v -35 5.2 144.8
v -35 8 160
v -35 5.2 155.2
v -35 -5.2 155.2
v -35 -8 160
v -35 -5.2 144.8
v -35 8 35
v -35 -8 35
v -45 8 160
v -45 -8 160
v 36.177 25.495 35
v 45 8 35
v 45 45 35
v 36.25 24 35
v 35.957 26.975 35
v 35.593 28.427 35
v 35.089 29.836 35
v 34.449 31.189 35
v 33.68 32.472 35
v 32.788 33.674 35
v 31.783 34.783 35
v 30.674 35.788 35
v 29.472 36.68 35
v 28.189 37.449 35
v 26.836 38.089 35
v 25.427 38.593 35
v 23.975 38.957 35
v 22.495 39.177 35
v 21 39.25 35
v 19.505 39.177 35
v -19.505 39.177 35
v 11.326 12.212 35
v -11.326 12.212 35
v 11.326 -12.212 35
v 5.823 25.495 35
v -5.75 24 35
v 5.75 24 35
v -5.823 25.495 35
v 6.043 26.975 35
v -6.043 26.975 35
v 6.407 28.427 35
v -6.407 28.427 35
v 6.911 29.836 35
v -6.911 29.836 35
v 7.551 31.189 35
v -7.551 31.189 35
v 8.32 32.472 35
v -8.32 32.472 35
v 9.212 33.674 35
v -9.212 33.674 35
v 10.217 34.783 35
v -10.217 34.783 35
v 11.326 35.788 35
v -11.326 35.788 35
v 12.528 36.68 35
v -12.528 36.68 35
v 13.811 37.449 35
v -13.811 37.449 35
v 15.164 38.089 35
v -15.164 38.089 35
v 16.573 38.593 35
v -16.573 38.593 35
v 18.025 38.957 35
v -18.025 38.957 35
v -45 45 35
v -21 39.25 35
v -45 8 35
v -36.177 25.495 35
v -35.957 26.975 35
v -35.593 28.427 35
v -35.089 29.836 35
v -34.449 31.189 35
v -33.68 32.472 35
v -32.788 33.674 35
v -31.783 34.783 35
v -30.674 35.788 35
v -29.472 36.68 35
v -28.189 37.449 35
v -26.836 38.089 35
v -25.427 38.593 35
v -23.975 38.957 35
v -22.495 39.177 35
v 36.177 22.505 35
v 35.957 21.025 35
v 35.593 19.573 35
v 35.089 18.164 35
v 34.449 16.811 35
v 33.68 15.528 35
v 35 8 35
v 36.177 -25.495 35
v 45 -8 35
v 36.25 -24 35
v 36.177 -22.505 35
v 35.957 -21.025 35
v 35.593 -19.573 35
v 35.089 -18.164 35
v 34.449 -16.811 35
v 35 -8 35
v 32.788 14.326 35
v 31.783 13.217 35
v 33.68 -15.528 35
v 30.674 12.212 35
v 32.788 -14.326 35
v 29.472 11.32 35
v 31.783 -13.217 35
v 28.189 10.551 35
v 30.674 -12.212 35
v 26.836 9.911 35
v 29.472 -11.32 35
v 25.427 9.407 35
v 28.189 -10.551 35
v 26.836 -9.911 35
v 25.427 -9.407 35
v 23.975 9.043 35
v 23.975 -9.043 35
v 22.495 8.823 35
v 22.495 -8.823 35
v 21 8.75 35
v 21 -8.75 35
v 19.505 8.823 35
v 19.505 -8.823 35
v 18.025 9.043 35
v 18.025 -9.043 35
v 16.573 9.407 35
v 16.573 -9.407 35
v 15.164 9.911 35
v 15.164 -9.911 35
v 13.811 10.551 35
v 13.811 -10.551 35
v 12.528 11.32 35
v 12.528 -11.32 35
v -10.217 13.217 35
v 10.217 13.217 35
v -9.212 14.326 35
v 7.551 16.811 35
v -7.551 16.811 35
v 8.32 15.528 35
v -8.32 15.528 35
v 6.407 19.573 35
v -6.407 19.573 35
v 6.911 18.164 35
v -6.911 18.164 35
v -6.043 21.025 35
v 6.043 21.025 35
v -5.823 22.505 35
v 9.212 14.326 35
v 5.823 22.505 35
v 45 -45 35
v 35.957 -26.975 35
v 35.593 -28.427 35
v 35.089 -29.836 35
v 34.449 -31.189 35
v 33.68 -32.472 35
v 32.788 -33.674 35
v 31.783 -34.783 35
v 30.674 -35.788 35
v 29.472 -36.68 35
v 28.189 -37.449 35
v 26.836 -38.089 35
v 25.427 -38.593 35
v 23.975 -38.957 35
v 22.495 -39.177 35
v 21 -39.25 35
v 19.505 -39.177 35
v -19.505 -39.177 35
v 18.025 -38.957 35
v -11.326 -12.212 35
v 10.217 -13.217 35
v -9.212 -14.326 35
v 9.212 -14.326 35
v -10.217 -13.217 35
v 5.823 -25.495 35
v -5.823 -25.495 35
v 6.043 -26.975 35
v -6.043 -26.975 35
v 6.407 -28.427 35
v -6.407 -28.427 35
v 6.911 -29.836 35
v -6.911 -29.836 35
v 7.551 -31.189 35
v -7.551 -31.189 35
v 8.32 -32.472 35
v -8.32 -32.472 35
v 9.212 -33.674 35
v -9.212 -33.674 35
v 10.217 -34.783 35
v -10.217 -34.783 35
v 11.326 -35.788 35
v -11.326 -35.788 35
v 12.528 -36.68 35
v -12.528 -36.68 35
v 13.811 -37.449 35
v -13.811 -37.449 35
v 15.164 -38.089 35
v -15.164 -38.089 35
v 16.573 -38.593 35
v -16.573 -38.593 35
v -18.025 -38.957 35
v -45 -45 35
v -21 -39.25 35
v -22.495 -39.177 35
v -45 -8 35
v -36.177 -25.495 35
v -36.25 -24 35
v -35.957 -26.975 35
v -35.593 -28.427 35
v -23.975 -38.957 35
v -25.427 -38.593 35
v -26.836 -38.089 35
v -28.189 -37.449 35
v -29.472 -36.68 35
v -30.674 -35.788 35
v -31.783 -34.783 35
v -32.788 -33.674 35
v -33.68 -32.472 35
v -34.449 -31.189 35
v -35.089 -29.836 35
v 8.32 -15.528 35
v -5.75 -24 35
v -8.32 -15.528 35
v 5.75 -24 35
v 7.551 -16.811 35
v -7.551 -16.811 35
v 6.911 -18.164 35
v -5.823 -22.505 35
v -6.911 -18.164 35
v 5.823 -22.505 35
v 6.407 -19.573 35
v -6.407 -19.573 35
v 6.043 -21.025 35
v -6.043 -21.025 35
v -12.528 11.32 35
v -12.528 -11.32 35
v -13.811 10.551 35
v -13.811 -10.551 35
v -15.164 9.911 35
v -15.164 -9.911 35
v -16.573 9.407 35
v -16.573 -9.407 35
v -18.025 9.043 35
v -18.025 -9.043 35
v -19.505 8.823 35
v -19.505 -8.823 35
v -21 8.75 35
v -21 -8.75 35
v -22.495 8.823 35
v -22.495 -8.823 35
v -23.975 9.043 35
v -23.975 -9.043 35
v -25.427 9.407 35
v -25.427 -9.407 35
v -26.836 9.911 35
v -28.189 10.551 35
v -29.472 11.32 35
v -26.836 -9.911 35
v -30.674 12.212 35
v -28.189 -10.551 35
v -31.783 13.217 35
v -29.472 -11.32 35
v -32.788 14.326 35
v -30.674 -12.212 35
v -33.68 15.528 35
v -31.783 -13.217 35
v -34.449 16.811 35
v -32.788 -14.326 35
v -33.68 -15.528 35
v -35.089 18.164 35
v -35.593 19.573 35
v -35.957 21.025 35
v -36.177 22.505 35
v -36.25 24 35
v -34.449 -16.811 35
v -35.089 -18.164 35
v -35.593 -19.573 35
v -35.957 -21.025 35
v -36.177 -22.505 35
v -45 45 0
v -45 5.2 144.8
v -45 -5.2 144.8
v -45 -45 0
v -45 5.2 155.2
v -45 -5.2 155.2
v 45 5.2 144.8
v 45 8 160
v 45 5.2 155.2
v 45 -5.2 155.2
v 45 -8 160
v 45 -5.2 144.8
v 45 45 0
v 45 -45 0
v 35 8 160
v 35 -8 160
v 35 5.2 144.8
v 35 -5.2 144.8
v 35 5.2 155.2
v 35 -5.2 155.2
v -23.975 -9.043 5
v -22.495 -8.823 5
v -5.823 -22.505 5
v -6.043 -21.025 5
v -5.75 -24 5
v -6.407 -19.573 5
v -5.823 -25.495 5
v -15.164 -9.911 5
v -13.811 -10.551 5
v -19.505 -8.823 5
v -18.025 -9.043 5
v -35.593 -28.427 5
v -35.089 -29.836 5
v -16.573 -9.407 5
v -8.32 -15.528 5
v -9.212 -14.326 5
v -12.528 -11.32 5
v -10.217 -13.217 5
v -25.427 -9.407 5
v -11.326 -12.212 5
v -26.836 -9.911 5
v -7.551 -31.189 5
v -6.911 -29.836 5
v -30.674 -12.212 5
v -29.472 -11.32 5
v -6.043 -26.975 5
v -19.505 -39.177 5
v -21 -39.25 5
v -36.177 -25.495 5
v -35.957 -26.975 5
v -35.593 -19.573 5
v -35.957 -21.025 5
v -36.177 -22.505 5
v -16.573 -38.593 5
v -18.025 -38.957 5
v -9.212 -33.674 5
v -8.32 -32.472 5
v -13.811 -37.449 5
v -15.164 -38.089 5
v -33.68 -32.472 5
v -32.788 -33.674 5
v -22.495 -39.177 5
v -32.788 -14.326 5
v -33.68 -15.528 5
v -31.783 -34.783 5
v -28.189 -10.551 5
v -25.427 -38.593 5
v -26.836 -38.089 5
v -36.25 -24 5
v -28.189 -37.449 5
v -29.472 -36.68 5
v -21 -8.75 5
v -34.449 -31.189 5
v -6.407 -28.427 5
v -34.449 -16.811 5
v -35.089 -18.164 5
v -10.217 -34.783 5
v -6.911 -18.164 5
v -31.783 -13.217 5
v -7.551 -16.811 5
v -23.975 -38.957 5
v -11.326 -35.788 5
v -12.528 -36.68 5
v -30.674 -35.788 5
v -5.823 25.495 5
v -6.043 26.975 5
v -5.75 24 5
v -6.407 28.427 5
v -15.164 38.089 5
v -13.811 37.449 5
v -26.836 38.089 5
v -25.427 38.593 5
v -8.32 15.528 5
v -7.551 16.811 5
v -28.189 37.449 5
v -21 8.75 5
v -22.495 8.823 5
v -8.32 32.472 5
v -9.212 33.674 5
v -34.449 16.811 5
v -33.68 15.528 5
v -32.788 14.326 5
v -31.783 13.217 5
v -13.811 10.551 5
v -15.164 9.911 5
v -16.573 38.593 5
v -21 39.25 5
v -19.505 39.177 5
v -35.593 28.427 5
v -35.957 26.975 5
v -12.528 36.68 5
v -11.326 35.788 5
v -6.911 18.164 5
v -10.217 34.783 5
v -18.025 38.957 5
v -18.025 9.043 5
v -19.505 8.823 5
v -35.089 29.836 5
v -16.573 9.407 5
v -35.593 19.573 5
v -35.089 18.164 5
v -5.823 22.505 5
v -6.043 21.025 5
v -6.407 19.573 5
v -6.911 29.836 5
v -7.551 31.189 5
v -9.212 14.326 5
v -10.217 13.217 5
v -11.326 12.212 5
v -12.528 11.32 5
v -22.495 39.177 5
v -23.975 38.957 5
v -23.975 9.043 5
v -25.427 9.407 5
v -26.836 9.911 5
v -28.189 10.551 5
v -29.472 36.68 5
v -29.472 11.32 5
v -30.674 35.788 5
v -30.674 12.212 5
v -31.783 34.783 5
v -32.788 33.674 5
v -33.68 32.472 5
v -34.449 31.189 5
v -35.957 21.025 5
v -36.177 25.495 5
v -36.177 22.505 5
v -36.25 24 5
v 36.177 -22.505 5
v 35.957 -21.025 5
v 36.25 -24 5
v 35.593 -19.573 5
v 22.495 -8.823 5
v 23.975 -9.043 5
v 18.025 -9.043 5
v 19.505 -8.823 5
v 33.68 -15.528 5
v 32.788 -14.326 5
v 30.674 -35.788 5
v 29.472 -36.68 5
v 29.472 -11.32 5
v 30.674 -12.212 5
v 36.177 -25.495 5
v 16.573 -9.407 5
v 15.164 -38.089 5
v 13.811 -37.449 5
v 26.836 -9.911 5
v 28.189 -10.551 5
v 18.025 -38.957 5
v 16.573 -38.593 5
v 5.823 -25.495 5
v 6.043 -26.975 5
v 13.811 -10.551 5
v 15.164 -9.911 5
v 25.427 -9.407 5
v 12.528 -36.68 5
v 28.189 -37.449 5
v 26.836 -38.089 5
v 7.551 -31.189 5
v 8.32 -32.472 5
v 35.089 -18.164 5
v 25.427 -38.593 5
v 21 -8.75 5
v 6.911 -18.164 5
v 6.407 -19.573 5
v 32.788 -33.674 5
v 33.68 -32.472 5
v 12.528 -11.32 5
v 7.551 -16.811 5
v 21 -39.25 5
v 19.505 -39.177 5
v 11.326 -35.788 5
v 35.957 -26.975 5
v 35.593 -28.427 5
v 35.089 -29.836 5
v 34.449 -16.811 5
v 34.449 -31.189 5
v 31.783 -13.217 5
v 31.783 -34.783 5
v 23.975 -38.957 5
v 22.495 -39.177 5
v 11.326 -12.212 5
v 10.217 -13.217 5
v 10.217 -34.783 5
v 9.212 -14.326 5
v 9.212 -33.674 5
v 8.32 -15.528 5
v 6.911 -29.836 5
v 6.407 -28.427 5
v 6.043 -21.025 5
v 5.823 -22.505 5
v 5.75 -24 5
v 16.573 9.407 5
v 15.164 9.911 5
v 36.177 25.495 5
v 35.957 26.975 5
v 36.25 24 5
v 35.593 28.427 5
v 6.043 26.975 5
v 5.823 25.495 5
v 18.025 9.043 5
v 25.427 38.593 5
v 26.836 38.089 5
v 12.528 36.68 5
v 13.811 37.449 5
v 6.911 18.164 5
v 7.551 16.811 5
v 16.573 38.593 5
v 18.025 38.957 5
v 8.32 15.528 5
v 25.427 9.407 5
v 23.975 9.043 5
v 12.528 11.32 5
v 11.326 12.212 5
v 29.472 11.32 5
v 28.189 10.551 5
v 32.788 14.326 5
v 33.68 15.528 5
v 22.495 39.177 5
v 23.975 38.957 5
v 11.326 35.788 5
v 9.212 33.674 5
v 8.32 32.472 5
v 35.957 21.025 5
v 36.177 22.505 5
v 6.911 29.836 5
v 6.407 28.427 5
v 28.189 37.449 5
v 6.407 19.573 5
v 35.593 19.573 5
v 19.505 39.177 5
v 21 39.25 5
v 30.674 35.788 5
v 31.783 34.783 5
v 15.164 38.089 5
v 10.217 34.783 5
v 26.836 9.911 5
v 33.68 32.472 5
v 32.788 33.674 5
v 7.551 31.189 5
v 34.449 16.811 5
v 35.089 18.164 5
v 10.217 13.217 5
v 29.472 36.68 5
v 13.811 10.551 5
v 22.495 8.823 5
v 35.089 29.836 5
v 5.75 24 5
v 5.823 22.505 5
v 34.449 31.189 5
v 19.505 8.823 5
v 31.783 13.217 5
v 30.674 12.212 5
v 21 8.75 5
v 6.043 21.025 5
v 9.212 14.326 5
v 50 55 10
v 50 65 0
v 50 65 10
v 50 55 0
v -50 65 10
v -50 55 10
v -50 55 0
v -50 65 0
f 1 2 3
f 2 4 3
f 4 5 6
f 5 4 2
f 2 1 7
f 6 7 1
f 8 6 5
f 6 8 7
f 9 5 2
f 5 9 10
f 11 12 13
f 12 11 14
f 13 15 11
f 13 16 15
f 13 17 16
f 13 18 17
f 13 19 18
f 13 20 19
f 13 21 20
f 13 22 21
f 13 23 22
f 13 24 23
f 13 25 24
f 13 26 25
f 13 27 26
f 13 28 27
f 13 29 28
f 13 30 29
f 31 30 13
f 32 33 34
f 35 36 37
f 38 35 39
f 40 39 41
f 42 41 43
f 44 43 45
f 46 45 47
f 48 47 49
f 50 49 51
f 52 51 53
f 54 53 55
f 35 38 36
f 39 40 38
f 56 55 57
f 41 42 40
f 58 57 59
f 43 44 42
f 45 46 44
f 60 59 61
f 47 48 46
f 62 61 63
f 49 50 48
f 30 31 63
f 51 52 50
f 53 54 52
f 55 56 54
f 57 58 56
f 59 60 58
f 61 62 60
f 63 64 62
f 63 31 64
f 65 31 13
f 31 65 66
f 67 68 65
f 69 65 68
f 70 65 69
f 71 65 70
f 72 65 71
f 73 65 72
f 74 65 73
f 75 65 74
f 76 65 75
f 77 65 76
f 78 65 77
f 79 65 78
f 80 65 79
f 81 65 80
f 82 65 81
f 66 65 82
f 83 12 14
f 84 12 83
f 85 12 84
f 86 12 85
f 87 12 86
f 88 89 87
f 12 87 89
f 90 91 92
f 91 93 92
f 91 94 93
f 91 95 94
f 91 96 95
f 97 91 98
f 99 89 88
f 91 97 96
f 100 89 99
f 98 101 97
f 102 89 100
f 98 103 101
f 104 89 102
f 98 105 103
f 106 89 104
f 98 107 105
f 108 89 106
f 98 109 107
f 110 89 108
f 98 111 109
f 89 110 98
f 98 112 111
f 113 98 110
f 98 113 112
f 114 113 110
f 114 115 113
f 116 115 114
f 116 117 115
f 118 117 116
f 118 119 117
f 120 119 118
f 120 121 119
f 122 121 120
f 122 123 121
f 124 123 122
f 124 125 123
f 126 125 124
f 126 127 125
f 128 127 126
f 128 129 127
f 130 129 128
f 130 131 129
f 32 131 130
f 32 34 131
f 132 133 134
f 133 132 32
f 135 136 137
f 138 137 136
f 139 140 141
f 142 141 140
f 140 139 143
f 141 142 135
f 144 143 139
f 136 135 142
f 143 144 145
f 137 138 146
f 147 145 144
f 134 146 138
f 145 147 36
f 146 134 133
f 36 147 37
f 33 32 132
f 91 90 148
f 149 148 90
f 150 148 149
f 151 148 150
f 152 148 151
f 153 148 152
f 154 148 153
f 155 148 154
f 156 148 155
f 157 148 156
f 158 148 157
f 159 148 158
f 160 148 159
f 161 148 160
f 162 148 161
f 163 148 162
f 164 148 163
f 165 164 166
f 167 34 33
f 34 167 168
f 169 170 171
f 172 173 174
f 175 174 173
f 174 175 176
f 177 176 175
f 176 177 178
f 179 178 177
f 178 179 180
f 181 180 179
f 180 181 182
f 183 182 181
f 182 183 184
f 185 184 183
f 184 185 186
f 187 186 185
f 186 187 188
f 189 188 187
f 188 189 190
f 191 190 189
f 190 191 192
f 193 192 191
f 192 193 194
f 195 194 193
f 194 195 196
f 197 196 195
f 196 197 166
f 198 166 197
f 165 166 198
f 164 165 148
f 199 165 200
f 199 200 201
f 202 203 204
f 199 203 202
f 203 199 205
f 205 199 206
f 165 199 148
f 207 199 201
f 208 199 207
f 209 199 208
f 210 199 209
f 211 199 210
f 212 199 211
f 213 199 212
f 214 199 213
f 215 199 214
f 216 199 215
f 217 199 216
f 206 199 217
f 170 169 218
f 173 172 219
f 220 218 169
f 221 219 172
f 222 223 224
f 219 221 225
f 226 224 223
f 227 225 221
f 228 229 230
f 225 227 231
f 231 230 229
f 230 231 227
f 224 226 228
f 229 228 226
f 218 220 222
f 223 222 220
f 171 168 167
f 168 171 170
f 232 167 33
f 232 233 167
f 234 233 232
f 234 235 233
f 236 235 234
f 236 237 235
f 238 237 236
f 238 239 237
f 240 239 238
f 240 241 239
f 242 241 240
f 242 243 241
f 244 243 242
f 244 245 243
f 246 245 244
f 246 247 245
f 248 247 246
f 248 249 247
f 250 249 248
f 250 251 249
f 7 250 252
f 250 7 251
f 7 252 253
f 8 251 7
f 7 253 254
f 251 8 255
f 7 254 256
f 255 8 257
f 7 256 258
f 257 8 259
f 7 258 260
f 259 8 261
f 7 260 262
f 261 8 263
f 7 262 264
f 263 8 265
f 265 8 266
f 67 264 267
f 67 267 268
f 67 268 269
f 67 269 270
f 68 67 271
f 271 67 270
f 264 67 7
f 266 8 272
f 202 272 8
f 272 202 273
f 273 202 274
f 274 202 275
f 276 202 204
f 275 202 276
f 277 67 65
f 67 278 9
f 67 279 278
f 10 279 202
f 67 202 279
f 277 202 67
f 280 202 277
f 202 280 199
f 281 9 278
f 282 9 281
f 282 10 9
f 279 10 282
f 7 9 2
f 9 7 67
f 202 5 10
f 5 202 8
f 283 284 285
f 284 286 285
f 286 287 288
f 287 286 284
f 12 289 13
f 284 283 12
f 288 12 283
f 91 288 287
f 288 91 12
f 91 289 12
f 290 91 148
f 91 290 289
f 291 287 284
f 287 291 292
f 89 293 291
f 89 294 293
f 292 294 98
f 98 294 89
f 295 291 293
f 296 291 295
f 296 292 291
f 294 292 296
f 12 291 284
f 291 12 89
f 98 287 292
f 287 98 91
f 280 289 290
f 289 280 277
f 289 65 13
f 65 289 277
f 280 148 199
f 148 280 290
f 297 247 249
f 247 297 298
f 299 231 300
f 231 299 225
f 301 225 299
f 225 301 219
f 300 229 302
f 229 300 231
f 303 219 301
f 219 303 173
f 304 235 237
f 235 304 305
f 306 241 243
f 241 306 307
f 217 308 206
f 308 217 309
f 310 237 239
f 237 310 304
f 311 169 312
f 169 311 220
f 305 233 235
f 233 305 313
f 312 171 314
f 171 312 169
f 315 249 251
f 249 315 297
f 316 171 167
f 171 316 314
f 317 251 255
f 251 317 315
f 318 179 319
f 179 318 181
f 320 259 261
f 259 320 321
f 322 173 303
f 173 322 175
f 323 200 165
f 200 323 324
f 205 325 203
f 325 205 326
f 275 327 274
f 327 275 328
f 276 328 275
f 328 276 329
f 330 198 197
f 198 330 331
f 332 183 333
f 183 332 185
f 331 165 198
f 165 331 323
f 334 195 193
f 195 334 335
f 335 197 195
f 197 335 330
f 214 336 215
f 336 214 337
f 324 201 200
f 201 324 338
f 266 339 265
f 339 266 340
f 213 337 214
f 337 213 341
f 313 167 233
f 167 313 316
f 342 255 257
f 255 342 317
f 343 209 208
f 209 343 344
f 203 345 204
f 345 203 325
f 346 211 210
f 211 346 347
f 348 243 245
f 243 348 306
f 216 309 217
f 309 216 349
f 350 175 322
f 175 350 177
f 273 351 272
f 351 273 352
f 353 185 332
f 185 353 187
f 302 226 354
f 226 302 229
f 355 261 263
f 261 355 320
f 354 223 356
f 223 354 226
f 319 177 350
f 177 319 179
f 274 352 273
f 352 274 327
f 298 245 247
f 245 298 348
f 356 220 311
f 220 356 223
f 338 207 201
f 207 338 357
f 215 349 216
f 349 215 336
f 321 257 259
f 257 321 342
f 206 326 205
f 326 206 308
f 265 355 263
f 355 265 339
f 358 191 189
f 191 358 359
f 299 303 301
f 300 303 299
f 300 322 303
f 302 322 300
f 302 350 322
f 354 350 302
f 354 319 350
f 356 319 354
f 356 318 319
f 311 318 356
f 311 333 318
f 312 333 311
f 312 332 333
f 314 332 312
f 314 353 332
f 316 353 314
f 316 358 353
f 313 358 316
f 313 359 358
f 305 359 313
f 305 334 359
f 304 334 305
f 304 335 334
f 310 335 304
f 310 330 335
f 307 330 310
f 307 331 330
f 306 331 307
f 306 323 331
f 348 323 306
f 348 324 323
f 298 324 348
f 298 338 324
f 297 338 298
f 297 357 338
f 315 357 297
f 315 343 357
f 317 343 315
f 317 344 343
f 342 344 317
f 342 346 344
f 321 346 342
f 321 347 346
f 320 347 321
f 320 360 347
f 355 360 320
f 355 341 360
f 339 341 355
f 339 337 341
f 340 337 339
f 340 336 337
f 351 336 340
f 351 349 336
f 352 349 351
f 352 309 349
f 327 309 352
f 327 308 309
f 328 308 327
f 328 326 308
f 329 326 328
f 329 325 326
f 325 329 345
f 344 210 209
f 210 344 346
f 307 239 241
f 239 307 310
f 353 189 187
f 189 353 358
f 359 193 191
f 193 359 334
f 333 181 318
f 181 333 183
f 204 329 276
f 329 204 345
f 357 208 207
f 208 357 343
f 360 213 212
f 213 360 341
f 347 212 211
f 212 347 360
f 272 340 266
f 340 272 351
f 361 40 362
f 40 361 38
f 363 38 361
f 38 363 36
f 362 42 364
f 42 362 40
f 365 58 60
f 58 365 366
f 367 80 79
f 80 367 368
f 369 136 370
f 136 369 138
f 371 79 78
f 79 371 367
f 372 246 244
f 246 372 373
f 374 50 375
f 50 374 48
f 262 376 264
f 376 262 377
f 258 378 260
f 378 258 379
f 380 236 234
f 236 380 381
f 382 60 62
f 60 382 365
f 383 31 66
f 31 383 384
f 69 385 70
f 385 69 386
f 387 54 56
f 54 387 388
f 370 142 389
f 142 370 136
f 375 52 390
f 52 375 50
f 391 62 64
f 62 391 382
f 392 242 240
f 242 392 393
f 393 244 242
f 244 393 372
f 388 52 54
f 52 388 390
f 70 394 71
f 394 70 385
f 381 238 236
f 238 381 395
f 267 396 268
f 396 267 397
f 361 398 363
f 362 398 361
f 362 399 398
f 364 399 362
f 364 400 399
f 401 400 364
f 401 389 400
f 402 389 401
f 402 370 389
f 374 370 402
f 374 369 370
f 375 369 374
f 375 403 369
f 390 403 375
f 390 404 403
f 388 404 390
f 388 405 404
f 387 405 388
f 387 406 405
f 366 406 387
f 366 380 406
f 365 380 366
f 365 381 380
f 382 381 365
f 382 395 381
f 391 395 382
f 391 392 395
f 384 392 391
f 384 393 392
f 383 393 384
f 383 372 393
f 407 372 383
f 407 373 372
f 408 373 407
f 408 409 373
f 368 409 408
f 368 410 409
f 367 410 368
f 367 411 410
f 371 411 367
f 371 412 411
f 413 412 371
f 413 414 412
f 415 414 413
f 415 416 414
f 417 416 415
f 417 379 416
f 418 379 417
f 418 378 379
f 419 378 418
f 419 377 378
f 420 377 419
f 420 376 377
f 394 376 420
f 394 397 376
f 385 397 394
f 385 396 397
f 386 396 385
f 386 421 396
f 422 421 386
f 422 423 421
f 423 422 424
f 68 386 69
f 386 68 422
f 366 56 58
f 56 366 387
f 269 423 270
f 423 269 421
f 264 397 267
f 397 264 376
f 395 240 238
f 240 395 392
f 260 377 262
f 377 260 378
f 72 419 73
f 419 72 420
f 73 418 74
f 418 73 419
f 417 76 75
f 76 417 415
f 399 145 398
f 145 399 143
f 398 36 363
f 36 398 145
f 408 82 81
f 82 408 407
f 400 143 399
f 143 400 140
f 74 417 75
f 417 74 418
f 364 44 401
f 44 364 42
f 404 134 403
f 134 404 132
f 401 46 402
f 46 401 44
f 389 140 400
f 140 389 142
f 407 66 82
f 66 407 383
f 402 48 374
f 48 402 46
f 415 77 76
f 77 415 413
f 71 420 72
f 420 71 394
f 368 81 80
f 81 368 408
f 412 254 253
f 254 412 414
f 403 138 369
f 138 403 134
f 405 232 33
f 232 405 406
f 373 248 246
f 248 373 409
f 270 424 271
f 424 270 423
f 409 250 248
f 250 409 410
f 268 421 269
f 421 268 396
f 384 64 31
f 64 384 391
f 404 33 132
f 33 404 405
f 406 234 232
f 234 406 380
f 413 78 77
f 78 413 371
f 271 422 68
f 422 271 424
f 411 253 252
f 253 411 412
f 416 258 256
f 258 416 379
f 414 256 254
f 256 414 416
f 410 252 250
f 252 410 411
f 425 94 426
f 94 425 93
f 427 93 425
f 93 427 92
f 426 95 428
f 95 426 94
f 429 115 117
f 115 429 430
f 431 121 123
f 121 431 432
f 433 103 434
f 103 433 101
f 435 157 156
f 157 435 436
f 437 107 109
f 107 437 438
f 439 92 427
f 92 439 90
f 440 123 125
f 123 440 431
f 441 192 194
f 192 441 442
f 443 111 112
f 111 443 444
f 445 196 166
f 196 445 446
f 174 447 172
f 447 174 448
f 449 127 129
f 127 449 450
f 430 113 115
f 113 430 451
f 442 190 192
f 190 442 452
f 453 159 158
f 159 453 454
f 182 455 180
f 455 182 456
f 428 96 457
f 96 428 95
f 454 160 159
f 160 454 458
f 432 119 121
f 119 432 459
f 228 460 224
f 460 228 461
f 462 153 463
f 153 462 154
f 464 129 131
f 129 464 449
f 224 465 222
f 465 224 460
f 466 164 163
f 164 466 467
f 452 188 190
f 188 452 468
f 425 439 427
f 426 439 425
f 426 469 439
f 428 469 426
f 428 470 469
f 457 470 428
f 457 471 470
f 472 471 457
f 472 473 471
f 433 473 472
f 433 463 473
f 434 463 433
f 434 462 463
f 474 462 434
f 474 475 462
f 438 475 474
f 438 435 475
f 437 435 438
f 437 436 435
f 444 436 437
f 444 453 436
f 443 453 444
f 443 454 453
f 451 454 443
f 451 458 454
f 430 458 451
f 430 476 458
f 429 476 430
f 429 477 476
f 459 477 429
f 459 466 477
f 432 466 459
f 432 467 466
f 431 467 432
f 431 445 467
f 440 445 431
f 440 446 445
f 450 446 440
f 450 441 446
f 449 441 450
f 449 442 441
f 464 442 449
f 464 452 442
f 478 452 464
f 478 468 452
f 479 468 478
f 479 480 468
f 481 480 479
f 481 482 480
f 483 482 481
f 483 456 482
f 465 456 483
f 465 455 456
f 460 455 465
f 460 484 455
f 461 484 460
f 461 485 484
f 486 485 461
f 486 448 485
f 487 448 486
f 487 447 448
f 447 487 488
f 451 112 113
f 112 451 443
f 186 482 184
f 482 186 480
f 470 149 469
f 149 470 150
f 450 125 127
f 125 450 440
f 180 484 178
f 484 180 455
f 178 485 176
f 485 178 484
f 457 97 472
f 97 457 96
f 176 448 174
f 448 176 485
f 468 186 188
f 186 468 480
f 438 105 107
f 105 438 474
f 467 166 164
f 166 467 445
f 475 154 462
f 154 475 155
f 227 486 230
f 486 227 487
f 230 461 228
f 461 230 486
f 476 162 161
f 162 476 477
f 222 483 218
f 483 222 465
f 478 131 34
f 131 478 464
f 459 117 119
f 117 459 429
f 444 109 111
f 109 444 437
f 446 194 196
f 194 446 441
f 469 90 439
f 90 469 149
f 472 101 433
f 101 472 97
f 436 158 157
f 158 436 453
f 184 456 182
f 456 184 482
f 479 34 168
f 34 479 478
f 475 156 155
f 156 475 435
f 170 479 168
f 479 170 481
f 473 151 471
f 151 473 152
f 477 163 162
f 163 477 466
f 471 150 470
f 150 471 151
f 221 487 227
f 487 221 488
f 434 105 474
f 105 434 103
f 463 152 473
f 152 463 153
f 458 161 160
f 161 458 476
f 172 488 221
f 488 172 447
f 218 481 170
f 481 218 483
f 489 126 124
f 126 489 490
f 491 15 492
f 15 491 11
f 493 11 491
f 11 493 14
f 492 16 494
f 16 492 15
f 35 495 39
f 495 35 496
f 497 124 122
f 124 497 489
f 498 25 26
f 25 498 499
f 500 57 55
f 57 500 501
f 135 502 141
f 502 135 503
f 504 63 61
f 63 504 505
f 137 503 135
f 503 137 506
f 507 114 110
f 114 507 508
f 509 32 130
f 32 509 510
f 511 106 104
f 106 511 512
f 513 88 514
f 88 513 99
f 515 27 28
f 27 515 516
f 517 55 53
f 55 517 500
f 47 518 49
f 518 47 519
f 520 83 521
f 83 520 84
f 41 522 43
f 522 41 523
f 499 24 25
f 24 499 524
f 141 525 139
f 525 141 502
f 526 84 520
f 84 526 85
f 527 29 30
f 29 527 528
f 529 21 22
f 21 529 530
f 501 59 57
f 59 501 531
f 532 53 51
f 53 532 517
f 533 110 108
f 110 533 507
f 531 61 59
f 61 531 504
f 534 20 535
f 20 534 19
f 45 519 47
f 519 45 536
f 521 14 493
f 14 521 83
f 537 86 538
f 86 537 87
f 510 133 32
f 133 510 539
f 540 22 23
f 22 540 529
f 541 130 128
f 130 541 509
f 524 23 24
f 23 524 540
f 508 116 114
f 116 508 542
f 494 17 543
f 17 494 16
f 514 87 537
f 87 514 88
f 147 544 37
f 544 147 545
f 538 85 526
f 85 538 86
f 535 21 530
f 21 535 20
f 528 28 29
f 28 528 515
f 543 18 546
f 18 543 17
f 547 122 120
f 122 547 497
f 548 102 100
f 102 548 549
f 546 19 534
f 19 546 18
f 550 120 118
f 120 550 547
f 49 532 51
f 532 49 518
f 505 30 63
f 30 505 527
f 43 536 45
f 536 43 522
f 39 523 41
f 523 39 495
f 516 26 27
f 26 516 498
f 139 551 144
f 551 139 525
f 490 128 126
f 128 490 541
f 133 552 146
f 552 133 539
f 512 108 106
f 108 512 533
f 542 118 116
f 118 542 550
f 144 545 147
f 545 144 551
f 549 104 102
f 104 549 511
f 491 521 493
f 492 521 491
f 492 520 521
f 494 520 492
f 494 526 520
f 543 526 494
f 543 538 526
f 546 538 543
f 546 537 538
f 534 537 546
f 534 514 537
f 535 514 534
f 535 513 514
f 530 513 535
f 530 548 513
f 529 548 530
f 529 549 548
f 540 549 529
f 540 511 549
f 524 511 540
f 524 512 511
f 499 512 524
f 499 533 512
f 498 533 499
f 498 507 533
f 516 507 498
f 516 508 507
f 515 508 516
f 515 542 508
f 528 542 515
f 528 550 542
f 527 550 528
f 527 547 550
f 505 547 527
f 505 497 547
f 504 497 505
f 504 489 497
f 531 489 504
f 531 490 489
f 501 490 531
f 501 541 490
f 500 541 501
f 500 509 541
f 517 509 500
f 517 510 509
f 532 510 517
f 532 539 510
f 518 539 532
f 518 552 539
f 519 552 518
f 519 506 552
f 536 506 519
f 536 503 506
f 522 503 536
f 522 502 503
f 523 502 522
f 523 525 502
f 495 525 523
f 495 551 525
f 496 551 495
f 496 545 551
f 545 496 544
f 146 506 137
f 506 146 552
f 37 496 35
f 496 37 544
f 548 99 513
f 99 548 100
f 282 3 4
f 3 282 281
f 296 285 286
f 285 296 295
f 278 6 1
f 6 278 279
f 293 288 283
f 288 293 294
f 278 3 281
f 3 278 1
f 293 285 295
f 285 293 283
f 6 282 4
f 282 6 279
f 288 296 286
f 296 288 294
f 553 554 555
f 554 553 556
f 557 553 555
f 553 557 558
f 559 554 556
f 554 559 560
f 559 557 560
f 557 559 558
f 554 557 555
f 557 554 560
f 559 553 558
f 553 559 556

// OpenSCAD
// KNOWN-RIGHT ALTERNATIVE (must pass): a correct part coded independently, with centred cubes
$fn=64;
difference(){ union(){ translate([-45,-45,0]) cube([90,90,35]); for(x=[-40,40]) translate([x,0,97.5]) cube([10,16,125],center=true); }
 for(x=[-21,21],y=[-24,24]) translate([x,y,5]) cylinder(d=30.5,h=31);
 translate([0,0,150]) cube([100,10.4,10.4],center=true); }
translate([0,60,5]) cube([100,10,10],center=true);
